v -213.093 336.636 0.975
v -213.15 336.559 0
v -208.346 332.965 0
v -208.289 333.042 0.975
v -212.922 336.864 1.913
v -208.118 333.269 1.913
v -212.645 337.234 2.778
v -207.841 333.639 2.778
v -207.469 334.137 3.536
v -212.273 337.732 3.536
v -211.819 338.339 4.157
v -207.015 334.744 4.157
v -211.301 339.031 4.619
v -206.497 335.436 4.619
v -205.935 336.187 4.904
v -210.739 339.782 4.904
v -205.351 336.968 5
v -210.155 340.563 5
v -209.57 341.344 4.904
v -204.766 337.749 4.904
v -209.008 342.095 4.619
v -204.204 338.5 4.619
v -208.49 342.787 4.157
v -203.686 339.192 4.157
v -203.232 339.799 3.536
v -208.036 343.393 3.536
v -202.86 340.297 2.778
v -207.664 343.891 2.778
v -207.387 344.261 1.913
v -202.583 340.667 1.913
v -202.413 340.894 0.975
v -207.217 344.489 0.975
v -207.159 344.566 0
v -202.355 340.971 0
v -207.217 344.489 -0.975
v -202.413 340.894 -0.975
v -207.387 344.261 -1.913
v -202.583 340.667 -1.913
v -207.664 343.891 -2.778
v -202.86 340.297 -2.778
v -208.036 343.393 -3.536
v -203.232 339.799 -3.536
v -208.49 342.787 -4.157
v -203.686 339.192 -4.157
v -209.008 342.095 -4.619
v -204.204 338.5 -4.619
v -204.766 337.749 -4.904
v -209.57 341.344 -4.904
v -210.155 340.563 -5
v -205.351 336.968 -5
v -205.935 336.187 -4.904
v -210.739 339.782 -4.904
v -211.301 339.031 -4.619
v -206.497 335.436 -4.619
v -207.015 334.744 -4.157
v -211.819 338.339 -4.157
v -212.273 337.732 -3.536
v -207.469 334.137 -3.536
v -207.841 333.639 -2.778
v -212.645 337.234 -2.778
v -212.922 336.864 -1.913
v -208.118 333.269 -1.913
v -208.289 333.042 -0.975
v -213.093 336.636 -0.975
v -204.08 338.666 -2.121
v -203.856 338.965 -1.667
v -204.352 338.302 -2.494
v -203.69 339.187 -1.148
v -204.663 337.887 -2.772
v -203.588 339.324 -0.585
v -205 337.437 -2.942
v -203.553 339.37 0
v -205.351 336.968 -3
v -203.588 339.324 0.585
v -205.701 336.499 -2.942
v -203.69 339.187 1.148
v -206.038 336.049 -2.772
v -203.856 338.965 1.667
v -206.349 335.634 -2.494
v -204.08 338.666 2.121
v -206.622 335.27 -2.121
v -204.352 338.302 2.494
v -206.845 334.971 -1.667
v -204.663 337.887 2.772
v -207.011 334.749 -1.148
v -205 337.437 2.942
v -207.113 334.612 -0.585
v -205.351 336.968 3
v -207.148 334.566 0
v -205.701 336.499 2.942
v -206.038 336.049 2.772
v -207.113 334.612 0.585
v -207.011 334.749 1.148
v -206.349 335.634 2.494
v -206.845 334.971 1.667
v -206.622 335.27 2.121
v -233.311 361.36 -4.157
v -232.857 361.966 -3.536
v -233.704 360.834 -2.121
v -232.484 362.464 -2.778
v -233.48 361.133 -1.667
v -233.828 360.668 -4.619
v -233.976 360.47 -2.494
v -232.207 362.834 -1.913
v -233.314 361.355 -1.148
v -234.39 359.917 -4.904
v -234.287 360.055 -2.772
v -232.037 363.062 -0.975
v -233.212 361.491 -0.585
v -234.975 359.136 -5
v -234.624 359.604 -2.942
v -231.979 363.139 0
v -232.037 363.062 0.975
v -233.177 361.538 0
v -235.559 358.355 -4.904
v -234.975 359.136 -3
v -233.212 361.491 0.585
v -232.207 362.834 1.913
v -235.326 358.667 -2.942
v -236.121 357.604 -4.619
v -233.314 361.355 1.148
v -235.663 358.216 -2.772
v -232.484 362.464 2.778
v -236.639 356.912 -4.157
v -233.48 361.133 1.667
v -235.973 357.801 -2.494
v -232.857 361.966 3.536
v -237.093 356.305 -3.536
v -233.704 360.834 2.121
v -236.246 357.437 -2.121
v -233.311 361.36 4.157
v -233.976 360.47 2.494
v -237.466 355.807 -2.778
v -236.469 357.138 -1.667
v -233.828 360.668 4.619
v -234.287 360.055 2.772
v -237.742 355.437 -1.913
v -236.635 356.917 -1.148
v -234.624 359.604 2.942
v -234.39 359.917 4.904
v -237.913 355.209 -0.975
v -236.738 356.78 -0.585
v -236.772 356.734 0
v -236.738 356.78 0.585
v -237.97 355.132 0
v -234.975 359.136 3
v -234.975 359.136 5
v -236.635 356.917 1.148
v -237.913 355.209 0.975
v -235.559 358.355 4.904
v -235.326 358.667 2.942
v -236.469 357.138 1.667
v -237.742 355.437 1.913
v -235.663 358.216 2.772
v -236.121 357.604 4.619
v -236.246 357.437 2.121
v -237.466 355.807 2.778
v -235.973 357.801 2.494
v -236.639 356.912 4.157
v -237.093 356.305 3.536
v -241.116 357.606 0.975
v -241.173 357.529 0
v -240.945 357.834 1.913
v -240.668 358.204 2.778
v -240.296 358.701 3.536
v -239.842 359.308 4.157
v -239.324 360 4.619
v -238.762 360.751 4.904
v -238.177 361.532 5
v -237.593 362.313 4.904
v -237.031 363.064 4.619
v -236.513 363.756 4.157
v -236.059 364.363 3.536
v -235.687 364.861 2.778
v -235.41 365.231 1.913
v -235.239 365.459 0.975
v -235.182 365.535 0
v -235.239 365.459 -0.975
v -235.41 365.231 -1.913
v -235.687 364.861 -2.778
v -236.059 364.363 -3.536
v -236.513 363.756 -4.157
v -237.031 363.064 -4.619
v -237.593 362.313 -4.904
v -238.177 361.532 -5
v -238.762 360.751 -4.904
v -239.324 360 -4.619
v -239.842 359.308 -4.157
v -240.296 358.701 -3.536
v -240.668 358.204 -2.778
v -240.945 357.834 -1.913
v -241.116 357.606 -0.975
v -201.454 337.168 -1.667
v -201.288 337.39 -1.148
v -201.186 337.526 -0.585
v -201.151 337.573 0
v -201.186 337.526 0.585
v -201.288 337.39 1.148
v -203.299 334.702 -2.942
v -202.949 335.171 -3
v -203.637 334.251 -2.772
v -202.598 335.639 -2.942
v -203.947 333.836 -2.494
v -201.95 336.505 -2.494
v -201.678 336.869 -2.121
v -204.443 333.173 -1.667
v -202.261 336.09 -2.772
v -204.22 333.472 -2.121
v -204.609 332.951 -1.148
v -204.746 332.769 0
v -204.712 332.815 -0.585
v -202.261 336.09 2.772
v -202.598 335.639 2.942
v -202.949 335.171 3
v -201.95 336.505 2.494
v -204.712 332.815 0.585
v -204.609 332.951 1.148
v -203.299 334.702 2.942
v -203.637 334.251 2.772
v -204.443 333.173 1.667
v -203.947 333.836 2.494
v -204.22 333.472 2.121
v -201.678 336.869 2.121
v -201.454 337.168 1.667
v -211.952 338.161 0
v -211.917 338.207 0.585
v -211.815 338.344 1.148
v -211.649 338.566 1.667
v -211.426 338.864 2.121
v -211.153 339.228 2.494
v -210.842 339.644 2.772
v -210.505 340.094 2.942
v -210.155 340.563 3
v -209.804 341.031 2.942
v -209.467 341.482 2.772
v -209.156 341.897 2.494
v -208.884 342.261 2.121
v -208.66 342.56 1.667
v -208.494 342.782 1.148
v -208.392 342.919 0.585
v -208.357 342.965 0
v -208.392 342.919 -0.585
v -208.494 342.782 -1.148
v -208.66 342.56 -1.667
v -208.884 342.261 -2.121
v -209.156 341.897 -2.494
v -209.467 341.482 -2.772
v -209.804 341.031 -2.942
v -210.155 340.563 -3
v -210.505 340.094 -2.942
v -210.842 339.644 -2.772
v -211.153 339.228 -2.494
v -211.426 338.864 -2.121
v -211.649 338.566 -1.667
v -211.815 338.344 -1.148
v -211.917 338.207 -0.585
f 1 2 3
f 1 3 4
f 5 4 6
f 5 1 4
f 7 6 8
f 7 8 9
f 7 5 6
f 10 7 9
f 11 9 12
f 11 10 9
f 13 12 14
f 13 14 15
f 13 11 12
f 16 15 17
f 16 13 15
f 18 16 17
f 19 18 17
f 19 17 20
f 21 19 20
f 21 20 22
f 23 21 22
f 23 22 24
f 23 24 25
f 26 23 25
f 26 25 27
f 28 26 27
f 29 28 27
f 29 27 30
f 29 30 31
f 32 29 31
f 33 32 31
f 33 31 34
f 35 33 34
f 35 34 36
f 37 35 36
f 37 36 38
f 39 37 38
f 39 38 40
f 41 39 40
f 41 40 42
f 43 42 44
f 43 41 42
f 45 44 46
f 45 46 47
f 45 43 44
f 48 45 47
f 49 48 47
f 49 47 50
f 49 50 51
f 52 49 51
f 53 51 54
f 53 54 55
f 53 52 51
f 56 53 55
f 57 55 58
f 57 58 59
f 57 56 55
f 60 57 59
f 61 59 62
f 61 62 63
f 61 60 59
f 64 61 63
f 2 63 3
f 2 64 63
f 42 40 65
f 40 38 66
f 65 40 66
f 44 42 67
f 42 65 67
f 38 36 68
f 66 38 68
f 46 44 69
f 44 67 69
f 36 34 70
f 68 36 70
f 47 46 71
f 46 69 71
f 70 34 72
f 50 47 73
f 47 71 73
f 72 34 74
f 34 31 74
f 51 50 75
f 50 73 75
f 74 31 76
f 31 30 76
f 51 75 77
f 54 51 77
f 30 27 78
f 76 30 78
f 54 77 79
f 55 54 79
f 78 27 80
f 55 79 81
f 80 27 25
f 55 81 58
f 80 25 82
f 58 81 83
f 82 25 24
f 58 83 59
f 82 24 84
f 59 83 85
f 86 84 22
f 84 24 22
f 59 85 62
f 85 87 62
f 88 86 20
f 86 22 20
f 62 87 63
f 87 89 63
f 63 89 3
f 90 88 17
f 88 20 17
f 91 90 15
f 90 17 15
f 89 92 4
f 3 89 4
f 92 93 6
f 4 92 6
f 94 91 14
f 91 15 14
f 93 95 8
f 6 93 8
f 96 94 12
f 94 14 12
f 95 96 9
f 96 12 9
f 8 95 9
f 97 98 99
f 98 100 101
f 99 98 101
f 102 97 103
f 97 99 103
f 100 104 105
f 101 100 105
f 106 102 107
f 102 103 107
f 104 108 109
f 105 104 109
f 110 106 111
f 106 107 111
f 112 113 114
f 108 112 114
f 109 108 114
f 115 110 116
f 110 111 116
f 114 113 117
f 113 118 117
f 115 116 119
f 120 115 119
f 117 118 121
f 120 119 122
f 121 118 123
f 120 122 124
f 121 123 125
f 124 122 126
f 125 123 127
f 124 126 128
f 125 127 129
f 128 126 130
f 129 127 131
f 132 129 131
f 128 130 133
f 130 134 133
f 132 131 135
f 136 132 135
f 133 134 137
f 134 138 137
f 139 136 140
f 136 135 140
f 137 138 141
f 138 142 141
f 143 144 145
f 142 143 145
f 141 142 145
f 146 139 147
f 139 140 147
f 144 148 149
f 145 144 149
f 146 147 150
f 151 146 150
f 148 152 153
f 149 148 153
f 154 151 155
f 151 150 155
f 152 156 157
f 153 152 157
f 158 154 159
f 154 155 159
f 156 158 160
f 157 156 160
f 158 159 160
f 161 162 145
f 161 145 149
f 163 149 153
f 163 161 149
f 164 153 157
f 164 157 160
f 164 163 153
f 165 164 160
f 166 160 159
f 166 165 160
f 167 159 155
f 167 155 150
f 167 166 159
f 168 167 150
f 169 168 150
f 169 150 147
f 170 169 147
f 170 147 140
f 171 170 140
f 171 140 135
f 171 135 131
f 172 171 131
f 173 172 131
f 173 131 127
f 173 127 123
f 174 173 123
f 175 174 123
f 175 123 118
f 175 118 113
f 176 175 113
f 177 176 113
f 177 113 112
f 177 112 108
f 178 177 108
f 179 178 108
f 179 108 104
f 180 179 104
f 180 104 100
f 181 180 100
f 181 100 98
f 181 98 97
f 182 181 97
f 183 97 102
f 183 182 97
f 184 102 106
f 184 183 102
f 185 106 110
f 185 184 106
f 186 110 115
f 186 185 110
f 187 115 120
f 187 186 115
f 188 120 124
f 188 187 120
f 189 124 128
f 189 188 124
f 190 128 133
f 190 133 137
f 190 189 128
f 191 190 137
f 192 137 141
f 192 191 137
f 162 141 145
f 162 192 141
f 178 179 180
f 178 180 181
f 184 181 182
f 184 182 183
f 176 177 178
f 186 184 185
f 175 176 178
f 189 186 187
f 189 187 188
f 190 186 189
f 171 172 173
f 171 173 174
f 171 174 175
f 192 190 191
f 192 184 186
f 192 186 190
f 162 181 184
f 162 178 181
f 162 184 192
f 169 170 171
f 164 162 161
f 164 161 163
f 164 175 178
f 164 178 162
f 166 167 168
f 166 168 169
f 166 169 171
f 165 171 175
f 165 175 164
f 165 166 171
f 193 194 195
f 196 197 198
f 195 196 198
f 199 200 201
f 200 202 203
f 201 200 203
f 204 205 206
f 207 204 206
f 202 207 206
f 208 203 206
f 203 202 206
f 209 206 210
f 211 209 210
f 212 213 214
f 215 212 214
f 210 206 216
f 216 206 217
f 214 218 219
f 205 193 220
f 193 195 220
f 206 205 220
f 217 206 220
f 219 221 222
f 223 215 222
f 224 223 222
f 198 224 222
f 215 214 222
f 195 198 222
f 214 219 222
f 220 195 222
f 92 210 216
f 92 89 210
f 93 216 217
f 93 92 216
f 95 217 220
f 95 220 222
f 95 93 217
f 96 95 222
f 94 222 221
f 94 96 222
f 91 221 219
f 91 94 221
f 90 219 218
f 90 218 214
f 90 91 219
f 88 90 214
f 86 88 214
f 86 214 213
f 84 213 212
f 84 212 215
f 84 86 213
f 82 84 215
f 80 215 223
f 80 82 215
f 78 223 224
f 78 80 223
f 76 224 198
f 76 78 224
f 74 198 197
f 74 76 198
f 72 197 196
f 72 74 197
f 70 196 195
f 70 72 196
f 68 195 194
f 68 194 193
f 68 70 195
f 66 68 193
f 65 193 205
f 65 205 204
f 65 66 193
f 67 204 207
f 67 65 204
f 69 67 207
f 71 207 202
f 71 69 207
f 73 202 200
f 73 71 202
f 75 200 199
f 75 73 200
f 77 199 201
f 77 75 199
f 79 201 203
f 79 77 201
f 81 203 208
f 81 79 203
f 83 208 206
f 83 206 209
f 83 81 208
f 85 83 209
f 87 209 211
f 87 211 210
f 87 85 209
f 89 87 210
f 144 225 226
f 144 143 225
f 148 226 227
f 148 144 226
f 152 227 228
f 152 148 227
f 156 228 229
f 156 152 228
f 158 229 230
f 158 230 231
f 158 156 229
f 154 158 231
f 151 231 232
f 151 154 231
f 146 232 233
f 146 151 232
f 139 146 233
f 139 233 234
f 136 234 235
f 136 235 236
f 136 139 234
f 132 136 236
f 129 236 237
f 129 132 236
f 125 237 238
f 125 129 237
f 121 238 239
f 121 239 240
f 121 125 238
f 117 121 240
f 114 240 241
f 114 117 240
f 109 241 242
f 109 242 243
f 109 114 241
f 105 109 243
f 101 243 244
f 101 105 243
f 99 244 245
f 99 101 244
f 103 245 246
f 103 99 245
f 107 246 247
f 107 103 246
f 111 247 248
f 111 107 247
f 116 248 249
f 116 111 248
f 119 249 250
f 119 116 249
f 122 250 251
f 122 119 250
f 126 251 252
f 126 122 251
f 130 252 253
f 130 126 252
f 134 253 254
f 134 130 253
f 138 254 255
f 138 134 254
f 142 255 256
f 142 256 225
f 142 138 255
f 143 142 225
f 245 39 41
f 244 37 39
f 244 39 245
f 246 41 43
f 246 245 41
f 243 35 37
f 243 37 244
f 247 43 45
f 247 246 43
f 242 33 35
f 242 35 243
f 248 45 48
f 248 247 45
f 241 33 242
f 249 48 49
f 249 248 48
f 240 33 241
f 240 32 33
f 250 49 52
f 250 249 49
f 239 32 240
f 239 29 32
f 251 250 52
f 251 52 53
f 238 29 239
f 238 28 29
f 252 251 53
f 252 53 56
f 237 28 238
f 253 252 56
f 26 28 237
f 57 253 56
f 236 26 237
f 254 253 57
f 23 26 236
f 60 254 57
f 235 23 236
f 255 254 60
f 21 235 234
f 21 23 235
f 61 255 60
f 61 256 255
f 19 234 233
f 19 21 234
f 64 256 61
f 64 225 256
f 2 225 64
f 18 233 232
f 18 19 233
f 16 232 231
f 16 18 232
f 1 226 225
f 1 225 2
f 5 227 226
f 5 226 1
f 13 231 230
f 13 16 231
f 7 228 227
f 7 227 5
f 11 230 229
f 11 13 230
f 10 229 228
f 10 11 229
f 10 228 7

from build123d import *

# Parameters (mm, degrees)
CABEZA_PROFILE_R  = 5
VASTAGO_PROFILE_R = 3
TUERCA_PROFILE_R  = 5


with BuildPart() as part:
    # Cabeza: sweep along a curve in space
    with BuildLine() as cabeza_path:
        Line((-234.974862986, 359.135649617, 0), (-238.177480086, 361.53215618, 0))
    # Cabeza profile (on start of the path) → Cabeza (sweep)
    with BuildSketch(Plane(origin=(-234.974862986, 359.135649617, 0), x_dir=(-0.5991266409502999, -0.8006542750173826, 0), z_dir=(-0.8006542750173826, 0.5991266409502999, 0))):
        Circle(CABEZA_PROFILE_R)
    sweep(path=cabeza_path.line)

    # Vastago: sweep along a curve in space
    with BuildLine() as vastago_path:
        Line((-202.948691985, 335.170583979, 0), (-234.974862986, 359.135649617, 0))
    # Vastago profile (on start of the path) → Vastago (sweep)
    with BuildSketch(Plane(origin=(-202.948691985, 335.170583979, 0), x_dir=(-0.5991266409502972, -0.8006542750173845, 0), z_dir=(-0.8006542750173845, 0.5991266409502972, 0))):
        Circle(VASTAGO_PROFILE_R)
    sweep(path=vastago_path.line)

    # Tuerca: sweep along a curve in space
    with BuildLine() as tuerca_path:
        Line((-205.35065481, 336.967963901, 0), (-210.15458046, 340.562723747, 0))
    # Tuerca profile (on start of the path) → Tuerca (sweep)
    with BuildSketch(Plane(origin=(-205.35065481, 336.967963901, 0), x_dir=(-0.5991266409502919, -0.8006542750173886, 0), z_dir=(-0.8006542750173886, 0.5991266409502919, 0))):
        Circle(TUERCA_PROFILE_R)
    sweep(path=tuerca_path.line)


solid = part.part
